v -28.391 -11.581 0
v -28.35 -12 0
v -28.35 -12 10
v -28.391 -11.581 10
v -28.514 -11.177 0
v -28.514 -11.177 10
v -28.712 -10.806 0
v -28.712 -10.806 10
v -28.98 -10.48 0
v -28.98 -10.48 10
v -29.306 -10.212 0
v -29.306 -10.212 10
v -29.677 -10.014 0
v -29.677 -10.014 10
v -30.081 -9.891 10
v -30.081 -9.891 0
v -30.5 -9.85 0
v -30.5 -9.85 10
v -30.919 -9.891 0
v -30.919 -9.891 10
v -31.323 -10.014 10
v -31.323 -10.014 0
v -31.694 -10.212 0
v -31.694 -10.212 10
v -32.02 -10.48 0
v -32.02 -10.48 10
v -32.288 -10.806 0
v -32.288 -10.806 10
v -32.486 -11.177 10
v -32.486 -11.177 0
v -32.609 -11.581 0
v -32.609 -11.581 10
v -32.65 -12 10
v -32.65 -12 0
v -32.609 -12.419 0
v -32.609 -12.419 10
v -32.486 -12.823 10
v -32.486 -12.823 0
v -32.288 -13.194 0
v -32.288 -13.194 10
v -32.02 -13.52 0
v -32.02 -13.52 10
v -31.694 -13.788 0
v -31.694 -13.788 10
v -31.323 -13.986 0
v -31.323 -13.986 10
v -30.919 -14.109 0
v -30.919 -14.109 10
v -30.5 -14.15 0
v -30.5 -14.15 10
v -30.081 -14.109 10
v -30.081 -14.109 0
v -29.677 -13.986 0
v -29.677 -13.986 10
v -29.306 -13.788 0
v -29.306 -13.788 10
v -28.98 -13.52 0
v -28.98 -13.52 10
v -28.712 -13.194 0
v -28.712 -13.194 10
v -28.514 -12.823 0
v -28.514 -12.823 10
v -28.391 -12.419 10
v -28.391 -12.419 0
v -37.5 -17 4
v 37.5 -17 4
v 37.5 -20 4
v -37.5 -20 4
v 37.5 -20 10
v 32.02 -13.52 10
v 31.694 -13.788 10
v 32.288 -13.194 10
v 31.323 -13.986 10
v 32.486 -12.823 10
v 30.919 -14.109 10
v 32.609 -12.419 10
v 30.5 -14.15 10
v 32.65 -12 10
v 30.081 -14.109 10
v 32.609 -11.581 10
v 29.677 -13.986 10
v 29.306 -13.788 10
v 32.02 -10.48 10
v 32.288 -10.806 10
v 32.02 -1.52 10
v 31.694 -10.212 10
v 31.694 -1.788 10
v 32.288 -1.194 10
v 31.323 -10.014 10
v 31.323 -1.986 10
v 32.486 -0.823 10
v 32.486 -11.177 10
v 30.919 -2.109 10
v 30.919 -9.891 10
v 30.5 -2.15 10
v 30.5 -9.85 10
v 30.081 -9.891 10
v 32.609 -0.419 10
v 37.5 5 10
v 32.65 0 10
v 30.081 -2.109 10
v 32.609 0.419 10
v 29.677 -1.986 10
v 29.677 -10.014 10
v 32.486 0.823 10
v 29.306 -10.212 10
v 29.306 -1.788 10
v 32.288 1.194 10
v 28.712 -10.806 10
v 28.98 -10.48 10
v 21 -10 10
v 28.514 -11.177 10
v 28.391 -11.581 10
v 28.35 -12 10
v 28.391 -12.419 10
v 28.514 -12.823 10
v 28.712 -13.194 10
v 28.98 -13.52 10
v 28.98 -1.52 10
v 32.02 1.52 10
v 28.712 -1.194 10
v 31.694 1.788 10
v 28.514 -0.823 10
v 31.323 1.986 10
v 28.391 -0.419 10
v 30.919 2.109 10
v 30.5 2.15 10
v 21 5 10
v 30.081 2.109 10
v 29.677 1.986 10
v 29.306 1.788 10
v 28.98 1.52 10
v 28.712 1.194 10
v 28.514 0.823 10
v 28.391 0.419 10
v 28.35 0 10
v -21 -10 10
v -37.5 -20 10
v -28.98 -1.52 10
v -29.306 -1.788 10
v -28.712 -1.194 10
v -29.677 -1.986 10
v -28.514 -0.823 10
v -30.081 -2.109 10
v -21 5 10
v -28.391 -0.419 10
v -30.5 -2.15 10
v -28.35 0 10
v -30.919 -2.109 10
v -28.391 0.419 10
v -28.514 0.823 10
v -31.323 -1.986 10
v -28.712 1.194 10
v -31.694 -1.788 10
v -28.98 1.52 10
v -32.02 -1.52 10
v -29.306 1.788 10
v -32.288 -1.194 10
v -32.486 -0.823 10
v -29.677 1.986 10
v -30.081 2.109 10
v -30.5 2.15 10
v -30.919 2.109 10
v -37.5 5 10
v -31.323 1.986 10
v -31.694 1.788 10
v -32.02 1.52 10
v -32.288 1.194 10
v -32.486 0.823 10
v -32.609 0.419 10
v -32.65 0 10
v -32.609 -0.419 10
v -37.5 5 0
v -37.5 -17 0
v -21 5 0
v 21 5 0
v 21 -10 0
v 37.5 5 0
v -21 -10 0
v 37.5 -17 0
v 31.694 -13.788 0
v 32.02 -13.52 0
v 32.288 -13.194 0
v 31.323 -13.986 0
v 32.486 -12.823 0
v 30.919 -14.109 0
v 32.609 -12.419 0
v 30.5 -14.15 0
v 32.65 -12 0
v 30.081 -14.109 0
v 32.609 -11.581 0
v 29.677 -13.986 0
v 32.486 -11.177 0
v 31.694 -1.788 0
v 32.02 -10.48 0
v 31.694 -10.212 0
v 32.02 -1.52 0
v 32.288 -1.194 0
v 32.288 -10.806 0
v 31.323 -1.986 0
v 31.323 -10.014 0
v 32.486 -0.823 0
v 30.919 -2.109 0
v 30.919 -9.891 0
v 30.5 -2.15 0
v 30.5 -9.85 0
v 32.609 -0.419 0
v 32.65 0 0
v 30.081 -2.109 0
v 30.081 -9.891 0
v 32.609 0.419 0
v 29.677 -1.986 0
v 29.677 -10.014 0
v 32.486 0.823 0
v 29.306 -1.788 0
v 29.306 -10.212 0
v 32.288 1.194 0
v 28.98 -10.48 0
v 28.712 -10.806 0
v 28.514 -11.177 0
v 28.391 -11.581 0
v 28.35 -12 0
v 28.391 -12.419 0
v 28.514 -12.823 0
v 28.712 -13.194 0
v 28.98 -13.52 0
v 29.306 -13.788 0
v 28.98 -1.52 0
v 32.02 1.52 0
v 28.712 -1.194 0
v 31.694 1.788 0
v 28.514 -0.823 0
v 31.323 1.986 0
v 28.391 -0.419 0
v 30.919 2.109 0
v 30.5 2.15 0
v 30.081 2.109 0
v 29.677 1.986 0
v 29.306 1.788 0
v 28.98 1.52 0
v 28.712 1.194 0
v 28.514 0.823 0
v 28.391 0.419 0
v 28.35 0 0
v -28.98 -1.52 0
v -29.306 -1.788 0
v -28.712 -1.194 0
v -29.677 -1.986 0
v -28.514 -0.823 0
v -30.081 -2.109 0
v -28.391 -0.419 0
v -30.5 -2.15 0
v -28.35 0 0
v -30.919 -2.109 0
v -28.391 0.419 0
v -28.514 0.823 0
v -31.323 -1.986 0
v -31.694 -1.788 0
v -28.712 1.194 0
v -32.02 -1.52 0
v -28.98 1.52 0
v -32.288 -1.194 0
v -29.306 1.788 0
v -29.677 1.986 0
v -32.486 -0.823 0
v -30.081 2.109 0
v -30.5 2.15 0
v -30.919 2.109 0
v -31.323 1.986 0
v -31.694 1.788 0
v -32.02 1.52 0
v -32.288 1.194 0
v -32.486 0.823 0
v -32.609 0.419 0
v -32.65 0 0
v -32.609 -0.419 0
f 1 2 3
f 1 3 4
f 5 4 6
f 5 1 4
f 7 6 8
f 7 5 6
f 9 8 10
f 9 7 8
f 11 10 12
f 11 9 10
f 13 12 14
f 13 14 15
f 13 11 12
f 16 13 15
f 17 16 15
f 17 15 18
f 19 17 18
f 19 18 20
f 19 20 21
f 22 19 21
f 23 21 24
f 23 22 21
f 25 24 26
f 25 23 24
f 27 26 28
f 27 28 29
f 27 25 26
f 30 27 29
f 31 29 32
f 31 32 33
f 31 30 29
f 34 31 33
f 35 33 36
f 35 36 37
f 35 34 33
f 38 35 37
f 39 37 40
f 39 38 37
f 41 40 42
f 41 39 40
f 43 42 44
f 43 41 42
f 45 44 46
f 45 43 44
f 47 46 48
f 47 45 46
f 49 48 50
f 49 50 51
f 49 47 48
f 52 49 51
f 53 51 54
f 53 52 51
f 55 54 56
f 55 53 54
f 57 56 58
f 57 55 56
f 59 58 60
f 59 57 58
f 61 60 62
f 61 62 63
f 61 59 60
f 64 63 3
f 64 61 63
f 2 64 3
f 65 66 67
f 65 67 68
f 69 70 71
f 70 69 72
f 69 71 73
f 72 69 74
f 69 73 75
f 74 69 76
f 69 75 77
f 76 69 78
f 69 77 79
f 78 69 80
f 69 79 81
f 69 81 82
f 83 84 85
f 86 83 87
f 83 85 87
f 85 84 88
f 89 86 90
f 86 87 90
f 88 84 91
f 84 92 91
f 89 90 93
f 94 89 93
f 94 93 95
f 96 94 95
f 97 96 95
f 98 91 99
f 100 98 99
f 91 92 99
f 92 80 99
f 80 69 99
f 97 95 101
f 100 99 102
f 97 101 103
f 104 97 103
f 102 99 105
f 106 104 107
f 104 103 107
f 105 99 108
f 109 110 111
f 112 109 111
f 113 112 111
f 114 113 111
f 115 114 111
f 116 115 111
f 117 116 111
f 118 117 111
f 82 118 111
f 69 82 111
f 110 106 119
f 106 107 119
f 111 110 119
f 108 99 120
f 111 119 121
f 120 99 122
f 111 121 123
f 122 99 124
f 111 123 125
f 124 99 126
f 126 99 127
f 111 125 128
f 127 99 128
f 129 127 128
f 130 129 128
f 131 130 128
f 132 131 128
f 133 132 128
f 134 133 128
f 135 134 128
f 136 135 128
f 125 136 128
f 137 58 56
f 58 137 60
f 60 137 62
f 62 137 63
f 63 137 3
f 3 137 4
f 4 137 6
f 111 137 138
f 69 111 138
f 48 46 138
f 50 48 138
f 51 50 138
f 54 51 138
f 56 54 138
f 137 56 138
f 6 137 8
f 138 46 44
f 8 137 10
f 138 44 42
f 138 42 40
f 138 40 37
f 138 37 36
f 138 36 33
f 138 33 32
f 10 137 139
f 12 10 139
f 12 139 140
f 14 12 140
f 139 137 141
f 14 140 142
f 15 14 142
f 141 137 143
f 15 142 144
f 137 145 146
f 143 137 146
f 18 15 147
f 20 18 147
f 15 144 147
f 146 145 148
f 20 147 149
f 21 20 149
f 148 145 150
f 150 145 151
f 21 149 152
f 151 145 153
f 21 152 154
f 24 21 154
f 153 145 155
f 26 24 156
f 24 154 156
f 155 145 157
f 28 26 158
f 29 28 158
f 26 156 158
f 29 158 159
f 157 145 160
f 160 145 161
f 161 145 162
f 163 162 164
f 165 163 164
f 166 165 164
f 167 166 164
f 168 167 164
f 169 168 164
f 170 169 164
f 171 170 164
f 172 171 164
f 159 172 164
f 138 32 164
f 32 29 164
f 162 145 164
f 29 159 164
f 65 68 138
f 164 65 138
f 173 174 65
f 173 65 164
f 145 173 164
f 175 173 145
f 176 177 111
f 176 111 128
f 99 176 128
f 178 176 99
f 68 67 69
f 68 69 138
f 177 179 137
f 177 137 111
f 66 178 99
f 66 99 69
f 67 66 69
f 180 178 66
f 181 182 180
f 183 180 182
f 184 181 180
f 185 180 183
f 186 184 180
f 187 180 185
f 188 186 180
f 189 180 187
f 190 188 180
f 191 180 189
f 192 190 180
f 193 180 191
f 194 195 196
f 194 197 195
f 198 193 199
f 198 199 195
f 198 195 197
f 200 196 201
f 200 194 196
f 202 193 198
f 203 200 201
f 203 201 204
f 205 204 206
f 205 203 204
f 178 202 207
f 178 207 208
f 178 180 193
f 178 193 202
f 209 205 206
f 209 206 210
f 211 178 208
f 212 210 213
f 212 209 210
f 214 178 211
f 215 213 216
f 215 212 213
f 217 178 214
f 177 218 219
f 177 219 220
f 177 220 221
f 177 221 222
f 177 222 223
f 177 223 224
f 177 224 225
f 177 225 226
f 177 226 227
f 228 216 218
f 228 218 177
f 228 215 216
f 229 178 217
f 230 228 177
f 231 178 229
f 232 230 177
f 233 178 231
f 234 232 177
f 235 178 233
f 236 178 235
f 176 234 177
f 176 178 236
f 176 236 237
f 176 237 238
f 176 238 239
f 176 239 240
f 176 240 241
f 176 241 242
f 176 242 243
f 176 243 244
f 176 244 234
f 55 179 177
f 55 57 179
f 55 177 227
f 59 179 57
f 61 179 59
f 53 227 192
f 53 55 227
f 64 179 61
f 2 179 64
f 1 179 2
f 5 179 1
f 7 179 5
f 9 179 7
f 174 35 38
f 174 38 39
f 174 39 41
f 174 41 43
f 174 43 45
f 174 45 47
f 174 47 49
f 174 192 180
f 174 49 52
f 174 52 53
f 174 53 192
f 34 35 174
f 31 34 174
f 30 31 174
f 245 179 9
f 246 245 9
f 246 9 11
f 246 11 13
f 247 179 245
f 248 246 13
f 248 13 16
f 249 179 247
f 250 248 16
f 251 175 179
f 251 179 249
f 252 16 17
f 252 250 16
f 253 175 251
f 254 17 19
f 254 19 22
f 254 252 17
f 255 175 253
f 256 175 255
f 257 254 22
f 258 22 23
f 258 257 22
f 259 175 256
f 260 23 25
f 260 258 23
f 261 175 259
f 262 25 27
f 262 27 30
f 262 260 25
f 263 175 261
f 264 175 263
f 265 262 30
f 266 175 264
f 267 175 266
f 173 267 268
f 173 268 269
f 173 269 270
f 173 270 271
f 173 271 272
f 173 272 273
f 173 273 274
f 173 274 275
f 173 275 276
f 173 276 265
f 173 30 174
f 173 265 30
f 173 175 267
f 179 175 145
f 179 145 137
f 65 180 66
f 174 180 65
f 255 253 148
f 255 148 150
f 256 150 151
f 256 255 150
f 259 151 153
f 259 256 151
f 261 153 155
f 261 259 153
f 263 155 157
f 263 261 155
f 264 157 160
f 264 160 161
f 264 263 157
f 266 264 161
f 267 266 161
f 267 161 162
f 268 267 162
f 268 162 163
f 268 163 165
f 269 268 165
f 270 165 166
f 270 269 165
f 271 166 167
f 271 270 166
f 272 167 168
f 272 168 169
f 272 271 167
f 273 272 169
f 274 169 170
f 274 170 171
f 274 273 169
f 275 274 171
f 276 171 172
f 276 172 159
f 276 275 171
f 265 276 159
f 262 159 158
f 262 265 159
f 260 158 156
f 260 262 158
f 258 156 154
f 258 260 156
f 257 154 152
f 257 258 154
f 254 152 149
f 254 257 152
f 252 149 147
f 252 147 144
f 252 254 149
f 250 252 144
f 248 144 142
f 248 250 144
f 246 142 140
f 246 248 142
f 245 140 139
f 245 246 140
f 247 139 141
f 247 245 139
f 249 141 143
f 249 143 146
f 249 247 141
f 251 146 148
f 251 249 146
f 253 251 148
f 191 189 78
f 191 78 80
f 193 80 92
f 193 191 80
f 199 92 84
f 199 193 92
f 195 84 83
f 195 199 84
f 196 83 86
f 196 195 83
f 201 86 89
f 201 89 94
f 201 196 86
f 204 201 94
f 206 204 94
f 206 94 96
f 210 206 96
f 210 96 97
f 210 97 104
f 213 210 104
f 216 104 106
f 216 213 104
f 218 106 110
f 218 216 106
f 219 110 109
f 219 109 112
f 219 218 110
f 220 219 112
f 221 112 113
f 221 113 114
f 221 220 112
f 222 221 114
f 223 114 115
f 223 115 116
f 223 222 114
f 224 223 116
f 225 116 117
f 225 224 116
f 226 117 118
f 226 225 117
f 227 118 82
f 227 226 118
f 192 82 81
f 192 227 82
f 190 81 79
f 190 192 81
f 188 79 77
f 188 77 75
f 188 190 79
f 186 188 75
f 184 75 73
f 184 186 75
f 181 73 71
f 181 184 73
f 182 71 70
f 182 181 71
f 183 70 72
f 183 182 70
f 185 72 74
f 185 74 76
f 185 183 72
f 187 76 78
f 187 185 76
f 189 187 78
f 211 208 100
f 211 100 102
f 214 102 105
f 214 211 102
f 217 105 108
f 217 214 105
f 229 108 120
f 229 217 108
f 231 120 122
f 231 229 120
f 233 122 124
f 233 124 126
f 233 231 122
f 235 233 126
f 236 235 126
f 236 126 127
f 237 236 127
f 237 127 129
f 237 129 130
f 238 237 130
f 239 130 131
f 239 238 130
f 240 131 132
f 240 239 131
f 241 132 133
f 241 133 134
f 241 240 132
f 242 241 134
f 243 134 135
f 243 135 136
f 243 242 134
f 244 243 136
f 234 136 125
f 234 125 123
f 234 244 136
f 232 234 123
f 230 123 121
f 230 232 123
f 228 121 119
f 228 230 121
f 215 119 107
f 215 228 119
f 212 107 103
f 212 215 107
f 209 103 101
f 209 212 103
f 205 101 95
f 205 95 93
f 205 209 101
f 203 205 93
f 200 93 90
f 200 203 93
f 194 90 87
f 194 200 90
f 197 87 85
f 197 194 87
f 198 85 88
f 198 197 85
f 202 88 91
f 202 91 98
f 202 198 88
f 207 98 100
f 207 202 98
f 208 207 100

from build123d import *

# Parameters (mm, degrees)
SKETCH1_R           = 2.15
BOSS_EXTRUDE1_DEPTH = 10
SKETCH3_W           = 75
SKETCH3_H           = 3
CUT_EXTRUDE1_DEPTH  = 4


with BuildPart() as part:
    # Sketch1 → Boss-Extrude1 (new body)
    with BuildSketch(Plane.XY):
        Polygon((21, 5), (37.5, 5), (37.5, -20), (-37.5, -20), (-37.5, 5), (-21, 5), (-21, -10), (21, -10), align=None)
        with Locations((-30.5, 0)):
            Circle(SKETCH1_R, mode=Mode.SUBTRACT)
        with Locations((-30.5, -12)):
            Circle(SKETCH1_R, mode=Mode.SUBTRACT)
        with Locations((30.5, 0)):
            Circle(SKETCH1_R, mode=Mode.SUBTRACT)
        with Locations((30.5, -12)):
            Circle(SKETCH1_R, mode=Mode.SUBTRACT)
    extrude(amount=BOSS_EXTRUDE1_DEPTH)

    # Sketch3 → Cut-Extrude1 (cut)
    with BuildSketch(Plane(origin=(0, 0, 0), x_dir=(-1, 0, 0), z_dir=(0, 0, -1))):
        with Locations((0, -18.5)):
            Rectangle(SKETCH3_W, SKETCH3_H)
    extrude(amount=-CUT_EXTRUDE1_DEPTH, mode=Mode.SUBTRACT)


solid = part.part
